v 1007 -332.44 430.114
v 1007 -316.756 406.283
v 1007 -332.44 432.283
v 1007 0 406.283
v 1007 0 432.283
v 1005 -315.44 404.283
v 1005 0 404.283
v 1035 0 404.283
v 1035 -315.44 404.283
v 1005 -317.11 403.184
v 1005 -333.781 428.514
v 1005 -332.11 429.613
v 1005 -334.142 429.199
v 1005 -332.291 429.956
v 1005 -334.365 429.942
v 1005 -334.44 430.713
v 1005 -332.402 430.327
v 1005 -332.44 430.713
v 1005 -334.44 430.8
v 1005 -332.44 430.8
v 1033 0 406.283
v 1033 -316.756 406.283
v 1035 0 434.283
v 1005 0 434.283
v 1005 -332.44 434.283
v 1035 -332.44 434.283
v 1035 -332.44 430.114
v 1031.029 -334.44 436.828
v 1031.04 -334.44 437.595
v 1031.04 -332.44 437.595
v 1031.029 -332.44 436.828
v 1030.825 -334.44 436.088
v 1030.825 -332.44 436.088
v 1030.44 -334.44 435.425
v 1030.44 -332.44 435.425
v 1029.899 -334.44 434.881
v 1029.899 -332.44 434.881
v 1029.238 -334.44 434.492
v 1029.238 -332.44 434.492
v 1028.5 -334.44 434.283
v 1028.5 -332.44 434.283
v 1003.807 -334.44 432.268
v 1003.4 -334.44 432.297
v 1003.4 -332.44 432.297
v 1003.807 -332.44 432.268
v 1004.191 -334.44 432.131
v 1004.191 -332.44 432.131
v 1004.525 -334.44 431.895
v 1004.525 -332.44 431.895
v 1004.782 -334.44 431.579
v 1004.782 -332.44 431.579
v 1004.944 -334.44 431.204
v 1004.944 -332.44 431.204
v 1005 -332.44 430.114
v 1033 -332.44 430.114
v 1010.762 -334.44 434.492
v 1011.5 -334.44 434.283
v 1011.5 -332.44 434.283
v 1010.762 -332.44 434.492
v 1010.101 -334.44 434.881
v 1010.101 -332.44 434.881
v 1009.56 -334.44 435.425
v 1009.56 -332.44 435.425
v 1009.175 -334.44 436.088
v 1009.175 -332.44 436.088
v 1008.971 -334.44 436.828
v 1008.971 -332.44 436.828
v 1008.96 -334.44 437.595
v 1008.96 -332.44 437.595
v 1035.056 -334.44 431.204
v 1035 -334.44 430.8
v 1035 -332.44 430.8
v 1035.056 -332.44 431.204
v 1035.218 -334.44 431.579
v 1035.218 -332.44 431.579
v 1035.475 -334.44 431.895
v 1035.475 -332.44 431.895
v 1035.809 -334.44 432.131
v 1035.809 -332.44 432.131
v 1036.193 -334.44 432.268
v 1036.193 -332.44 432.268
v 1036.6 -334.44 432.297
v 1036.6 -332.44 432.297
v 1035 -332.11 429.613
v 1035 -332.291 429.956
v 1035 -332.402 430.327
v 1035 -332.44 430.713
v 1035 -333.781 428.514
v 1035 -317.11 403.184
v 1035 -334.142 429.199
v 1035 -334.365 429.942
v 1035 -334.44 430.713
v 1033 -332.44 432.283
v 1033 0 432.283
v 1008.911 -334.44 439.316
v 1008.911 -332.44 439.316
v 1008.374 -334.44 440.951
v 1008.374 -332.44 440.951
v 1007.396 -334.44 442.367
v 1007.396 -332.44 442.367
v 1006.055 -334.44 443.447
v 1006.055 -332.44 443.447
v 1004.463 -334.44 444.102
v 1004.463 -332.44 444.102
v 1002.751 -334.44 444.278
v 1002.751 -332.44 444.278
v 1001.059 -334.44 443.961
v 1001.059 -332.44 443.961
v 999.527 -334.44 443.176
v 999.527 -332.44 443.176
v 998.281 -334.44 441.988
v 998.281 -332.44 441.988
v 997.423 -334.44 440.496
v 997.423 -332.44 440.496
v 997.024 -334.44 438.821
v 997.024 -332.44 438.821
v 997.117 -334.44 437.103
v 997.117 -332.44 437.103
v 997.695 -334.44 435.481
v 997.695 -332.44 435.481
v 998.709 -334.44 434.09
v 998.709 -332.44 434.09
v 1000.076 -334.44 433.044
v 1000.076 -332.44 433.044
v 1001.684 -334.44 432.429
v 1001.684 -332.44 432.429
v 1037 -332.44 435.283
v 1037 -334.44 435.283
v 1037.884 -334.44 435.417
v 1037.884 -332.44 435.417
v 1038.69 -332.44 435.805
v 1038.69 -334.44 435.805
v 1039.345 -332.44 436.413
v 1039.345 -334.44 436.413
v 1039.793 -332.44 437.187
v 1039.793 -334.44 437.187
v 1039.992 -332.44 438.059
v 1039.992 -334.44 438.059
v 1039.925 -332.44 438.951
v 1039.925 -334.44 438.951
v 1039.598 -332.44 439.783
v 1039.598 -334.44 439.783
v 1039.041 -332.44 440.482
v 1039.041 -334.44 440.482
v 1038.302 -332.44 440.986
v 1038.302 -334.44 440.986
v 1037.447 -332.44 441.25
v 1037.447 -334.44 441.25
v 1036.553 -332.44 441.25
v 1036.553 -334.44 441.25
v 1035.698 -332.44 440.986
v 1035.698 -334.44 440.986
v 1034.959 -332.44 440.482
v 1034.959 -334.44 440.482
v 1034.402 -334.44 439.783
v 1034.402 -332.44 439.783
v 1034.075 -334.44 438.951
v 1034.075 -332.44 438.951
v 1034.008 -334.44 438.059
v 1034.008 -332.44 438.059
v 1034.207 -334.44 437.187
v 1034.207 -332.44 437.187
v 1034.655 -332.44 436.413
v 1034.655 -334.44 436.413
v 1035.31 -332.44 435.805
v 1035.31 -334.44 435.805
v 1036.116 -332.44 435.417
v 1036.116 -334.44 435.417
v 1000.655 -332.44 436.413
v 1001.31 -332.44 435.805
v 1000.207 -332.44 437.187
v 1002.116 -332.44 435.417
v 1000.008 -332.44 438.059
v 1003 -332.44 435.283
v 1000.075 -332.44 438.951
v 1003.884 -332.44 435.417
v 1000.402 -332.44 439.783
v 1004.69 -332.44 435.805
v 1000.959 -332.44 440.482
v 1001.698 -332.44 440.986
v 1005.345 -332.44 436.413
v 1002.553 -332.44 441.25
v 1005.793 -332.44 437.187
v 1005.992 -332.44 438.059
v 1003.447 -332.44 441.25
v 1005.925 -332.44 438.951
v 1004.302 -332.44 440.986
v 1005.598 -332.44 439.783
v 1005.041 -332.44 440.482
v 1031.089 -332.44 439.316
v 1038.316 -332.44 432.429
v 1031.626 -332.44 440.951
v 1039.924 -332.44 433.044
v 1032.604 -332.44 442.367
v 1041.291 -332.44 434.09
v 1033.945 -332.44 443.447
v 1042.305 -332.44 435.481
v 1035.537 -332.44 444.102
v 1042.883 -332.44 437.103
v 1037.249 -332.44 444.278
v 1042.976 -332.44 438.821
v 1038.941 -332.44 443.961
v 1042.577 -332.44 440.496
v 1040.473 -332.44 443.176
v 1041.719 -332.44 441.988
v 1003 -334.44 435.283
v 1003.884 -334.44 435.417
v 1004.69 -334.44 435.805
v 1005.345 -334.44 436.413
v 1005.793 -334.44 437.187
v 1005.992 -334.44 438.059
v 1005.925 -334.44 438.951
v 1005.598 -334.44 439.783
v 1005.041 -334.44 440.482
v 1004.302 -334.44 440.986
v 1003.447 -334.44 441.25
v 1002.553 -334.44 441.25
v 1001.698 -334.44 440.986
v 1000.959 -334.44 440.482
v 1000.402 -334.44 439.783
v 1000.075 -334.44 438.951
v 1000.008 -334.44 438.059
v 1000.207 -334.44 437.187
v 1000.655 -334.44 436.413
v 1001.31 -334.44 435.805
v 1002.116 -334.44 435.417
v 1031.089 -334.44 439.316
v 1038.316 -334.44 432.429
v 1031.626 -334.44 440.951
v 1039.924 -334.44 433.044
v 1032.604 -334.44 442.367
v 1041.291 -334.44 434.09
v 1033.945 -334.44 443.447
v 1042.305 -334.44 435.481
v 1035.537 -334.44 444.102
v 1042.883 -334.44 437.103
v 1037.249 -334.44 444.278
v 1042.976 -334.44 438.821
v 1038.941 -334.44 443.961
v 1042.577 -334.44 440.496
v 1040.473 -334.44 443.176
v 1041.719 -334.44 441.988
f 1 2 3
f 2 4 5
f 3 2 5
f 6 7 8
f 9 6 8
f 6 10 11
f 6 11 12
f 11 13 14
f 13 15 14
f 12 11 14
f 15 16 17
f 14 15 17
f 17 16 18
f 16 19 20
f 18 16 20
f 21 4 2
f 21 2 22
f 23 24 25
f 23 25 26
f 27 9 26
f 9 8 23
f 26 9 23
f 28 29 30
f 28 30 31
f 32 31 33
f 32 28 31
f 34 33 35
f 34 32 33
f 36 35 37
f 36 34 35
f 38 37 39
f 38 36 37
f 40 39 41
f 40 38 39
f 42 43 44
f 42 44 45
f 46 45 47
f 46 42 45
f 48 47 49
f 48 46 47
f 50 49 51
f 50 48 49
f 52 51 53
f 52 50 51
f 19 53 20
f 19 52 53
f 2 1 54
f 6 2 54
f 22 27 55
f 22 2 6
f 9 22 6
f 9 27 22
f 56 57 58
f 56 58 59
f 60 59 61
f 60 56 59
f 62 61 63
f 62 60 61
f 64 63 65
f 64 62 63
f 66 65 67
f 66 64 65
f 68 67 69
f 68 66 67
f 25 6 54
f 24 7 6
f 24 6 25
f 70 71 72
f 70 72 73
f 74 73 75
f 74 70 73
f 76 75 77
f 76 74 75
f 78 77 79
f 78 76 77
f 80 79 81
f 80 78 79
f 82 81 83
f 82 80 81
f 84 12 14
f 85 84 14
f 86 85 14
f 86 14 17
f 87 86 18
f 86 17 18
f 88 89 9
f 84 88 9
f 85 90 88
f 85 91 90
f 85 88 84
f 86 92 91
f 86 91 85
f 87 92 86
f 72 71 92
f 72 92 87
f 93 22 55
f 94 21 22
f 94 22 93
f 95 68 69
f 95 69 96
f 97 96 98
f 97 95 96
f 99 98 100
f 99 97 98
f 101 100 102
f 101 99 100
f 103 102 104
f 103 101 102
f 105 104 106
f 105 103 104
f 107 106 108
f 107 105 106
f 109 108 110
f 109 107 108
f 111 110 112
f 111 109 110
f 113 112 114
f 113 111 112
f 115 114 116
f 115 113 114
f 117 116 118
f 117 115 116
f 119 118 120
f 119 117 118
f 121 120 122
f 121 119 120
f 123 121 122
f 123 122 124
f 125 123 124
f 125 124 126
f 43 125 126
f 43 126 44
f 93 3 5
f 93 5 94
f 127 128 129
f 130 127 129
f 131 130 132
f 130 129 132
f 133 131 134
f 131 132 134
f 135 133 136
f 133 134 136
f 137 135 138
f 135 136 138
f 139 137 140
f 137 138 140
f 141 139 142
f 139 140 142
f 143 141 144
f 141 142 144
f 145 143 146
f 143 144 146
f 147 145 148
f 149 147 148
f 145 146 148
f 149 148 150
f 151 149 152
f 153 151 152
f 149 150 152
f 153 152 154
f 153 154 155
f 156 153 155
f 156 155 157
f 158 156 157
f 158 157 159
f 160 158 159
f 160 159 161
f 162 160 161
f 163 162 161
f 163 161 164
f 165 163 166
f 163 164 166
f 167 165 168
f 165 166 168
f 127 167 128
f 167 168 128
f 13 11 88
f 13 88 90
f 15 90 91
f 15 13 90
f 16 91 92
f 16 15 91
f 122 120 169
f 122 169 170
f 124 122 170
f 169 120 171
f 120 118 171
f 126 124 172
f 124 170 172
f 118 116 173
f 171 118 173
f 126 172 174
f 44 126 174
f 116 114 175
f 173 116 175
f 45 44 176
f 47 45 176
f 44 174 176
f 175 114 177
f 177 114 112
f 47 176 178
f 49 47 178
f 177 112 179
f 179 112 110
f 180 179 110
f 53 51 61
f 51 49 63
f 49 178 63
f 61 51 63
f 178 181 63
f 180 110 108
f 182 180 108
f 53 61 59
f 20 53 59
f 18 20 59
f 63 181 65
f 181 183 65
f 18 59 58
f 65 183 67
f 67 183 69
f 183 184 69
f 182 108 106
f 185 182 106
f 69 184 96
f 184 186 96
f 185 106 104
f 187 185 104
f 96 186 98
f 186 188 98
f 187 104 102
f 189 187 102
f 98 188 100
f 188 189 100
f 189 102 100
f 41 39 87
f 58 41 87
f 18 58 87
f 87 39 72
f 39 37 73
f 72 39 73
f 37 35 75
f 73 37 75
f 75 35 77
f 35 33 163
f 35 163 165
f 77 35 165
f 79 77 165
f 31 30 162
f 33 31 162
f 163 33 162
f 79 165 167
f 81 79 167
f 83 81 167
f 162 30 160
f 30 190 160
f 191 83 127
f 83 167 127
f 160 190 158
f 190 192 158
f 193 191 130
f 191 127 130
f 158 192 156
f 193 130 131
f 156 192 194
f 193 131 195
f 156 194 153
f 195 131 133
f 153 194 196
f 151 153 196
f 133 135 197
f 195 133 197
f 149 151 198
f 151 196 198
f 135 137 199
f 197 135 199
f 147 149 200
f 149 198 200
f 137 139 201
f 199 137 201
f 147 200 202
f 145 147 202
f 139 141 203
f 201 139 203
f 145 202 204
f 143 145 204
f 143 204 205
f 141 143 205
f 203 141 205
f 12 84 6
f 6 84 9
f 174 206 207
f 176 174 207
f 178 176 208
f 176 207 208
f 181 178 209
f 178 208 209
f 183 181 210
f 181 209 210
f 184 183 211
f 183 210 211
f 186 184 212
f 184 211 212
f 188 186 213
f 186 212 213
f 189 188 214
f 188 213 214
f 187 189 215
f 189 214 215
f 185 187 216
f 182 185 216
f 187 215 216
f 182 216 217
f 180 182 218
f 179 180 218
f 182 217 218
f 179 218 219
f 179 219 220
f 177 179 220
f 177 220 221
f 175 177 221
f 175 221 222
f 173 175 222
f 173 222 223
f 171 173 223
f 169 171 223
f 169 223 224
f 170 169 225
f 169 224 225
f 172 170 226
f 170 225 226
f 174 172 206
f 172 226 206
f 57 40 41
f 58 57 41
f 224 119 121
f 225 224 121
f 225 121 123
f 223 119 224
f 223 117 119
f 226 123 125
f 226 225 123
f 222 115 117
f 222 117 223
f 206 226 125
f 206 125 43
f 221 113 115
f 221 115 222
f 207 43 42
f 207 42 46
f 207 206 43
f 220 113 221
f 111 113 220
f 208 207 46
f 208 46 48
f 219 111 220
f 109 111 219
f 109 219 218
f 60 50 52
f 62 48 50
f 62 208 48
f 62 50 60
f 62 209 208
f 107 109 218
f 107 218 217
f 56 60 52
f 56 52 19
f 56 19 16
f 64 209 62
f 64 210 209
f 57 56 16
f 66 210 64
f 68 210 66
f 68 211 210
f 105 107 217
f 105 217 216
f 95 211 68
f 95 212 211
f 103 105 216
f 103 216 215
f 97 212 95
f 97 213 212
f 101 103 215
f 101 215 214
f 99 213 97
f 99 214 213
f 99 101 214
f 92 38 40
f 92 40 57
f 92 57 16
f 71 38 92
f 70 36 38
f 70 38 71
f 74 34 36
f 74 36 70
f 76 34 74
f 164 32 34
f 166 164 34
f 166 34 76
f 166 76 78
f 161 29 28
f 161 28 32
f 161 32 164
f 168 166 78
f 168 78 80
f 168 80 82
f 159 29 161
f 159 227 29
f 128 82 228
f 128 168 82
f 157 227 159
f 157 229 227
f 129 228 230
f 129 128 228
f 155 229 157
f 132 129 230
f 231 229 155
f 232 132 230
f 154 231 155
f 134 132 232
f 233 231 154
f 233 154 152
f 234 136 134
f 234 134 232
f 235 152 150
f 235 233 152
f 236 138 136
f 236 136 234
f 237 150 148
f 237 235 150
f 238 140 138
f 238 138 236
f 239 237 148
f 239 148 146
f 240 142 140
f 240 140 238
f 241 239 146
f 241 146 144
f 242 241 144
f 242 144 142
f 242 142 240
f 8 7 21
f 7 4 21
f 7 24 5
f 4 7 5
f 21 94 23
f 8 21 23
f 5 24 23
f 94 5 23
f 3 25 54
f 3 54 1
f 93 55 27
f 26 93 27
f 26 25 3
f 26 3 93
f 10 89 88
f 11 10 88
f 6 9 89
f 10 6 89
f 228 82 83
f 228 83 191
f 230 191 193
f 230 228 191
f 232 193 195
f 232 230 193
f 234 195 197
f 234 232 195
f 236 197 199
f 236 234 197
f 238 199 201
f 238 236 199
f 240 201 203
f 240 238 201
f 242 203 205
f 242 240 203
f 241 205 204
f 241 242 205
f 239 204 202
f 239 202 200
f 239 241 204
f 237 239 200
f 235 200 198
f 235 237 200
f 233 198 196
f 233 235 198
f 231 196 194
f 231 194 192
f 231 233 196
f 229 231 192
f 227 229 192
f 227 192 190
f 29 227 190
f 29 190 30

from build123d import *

# Parameters (mm, degrees)
SZKIC1_W                               = 30
SZKIC1_H                               = 30
SZKIC1_W_2                             = 26
SZKIC1_H_2                             = 26
PUTM_F_SQUARE_PROFILES_30X30X2_1_DEPTH = 332.439810961
WYTNIJ_WYCI_GNI_CIE2_DEPTH             = 548.739128832
WYCI_GNI_CIE_CIENKA_CIANKA1_DEPTH      = 30
KONWERTUJ_START                        = 1005
KONWERTUJ_BRY_1_DEPTH                  = 30
KONWERTUJ_BRY_1_2_DEPTH                = 30
SZKIC10_R                              = 3
DODANIE_WYCI_GNI_CIE3_DEPTH            = 2


# Read off the part's stored shape, not the designer's step: Konwertuj bryłę1
with BuildPart() as part:
    # Szkic1 → Putm-f-square-profiles 30X30X2(1) (new body)
    with BuildSketch(Plane(origin=(1020, 0, 419.283231707), x_dir=(1, 0, 0), z_dir=(0, -1, 0))):
        Rectangle(SZKIC1_W, SZKIC1_H)
        Rectangle(SZKIC1_W_2, SZKIC1_H_2, mode=Mode.SUBTRACT)
    extrude(amount=PUTM_F_SQUARE_PROFILES_30X30X2_1_DEPTH)

    # Szkic4 → Wytnij-wyciągnięcie2 (cut, through all)
    with BuildSketch(Plane(origin=(1035, 0, 0), x_dir=(0, 0, -1), z_dir=(1, 0, 0))):
        Polygon((-430.113764924, -332.439810961), (-404.283231707, -315.439810961), (-404.283231707, -332.439810961), align=None)
    extrude(amount=-WYTNIJ_WYCI_GNI_CIE2_DEPTH, mode=Mode.SUBTRACT)


with BuildPart() as body_2:
    # Szkic5 → Wyciągnięcie-cienka ścianka1 (new, through all)
    with BuildSketch(Plane(origin=(1035, 0, 0), x_dir=(0, 0, -1), z_dir=(1, 0, 0))):
        Polygon((-434.283231707, -332.439810961), (-430.113764924, -332.439810961), (-404.283231707, -315.439810961), (-403.183717583, -317.110460144), (-429.514680638, -334.439810961), (-434.283231707, -334.439810961), align=None)
    extrude(amount=-WYCI_GNI_CIE_CIENKA_CIANKA1_DEPTH)

    # Konwertuj bryłę1 outline → Konwertuj bryłę1 (cut)
    with BuildSketch(Plane.YZ.offset(KONWERTUJ_START)):
        with BuildLine():
            ThreePointArc((-333.781109326, 428.513820963), (-334.271598629, 429.56506732), (-334.439810961, 430.712849211))
            Line((-334.439810961, 430.712849211), (-334.439810961, 429.514680638))
            Line((-334.439810961, 429.514680638), (-333.781109326, 428.513820963))
        make_face()
    extrude(amount=KONWERTUJ_BRY_1_DEPTH, mode=Mode.SUBTRACT)

    # Konwertuj bry_1 2 outline → Konwertuj bry_1 2 (add)
    with BuildSketch(Plane.YZ.offset(KONWERTUJ_START)):
        with BuildLine():
            ThreePointArc((-332.110460144, 429.613335087), (-332.355704795, 430.138958265), (-332.439810961, 430.712849211))
            Line((-332.439810961, 430.712849211), (-332.439810961, 430.113764924))
            Line((-332.439810961, 430.113764924), (-332.110460144, 429.613335087))
        make_face()
    extrude(amount=KONWERTUJ_BRY_1_2_DEPTH)

    # Szkic10 → Dodanie-wyciągnięcie3 (add)
    # profile 1 of 2: a face of its own
    with BuildSketch(Plane.XZ.offset(334.439810961)):
        with BuildLine():
            ThreePointArc((1031.039616452, 437.59488008), (1030.440005619, 435.425099056), (1028.5, 434.283231707))
            Line((1028.5, 434.283231707), (1035, 434.283231707))
            Line((1035, 434.283231707), (1035, 430.799916934))
            ThreePointArc((1035, 430.799916934), (1035.475304923, 431.895362049), (1036.6, 432.296579888))
            ThreePointArc((1036.6, 432.296579888), (1041.13903563, 442.62700703), (1031.039616452, 437.59488008))
        make_face()
        with Locations(Location((1037, 438.283231707, 0), (0, 0, 270))):
            Circle(SZKIC10_R, mode=Mode.SUBTRACT)
    # profile 2 of 2: a face of its own
    with BuildSketch(Plane.XZ.offset(334.439810961)):
        with BuildLine():
            Line((1005, 430.799916934), (1005, 434.283231707))
            Line((1005, 434.283231707), (1011.5, 434.283231707))
            ThreePointArc((1011.5, 434.283231707), (1009.559994381, 435.425099056), (1008.960383548, 437.59488008))
            ThreePointArc((1008.960383548, 437.59488008), (998.86096437, 442.62700703), (1003.4, 432.296579888))
            ThreePointArc((1003.4, 432.296579888), (1004.524695077, 431.895362049), (1005, 430.799916934))
        make_face()
        with Locations(Location((1003, 438.283231707, 0), (0, 0, 270))):
            Circle(SZKIC10_R, mode=Mode.SUBTRACT)
    extrude(amount=-DODANIE_WYCI_GNI_CIE3_DEPTH)


solid = Compound([part.part, body_2.part])
